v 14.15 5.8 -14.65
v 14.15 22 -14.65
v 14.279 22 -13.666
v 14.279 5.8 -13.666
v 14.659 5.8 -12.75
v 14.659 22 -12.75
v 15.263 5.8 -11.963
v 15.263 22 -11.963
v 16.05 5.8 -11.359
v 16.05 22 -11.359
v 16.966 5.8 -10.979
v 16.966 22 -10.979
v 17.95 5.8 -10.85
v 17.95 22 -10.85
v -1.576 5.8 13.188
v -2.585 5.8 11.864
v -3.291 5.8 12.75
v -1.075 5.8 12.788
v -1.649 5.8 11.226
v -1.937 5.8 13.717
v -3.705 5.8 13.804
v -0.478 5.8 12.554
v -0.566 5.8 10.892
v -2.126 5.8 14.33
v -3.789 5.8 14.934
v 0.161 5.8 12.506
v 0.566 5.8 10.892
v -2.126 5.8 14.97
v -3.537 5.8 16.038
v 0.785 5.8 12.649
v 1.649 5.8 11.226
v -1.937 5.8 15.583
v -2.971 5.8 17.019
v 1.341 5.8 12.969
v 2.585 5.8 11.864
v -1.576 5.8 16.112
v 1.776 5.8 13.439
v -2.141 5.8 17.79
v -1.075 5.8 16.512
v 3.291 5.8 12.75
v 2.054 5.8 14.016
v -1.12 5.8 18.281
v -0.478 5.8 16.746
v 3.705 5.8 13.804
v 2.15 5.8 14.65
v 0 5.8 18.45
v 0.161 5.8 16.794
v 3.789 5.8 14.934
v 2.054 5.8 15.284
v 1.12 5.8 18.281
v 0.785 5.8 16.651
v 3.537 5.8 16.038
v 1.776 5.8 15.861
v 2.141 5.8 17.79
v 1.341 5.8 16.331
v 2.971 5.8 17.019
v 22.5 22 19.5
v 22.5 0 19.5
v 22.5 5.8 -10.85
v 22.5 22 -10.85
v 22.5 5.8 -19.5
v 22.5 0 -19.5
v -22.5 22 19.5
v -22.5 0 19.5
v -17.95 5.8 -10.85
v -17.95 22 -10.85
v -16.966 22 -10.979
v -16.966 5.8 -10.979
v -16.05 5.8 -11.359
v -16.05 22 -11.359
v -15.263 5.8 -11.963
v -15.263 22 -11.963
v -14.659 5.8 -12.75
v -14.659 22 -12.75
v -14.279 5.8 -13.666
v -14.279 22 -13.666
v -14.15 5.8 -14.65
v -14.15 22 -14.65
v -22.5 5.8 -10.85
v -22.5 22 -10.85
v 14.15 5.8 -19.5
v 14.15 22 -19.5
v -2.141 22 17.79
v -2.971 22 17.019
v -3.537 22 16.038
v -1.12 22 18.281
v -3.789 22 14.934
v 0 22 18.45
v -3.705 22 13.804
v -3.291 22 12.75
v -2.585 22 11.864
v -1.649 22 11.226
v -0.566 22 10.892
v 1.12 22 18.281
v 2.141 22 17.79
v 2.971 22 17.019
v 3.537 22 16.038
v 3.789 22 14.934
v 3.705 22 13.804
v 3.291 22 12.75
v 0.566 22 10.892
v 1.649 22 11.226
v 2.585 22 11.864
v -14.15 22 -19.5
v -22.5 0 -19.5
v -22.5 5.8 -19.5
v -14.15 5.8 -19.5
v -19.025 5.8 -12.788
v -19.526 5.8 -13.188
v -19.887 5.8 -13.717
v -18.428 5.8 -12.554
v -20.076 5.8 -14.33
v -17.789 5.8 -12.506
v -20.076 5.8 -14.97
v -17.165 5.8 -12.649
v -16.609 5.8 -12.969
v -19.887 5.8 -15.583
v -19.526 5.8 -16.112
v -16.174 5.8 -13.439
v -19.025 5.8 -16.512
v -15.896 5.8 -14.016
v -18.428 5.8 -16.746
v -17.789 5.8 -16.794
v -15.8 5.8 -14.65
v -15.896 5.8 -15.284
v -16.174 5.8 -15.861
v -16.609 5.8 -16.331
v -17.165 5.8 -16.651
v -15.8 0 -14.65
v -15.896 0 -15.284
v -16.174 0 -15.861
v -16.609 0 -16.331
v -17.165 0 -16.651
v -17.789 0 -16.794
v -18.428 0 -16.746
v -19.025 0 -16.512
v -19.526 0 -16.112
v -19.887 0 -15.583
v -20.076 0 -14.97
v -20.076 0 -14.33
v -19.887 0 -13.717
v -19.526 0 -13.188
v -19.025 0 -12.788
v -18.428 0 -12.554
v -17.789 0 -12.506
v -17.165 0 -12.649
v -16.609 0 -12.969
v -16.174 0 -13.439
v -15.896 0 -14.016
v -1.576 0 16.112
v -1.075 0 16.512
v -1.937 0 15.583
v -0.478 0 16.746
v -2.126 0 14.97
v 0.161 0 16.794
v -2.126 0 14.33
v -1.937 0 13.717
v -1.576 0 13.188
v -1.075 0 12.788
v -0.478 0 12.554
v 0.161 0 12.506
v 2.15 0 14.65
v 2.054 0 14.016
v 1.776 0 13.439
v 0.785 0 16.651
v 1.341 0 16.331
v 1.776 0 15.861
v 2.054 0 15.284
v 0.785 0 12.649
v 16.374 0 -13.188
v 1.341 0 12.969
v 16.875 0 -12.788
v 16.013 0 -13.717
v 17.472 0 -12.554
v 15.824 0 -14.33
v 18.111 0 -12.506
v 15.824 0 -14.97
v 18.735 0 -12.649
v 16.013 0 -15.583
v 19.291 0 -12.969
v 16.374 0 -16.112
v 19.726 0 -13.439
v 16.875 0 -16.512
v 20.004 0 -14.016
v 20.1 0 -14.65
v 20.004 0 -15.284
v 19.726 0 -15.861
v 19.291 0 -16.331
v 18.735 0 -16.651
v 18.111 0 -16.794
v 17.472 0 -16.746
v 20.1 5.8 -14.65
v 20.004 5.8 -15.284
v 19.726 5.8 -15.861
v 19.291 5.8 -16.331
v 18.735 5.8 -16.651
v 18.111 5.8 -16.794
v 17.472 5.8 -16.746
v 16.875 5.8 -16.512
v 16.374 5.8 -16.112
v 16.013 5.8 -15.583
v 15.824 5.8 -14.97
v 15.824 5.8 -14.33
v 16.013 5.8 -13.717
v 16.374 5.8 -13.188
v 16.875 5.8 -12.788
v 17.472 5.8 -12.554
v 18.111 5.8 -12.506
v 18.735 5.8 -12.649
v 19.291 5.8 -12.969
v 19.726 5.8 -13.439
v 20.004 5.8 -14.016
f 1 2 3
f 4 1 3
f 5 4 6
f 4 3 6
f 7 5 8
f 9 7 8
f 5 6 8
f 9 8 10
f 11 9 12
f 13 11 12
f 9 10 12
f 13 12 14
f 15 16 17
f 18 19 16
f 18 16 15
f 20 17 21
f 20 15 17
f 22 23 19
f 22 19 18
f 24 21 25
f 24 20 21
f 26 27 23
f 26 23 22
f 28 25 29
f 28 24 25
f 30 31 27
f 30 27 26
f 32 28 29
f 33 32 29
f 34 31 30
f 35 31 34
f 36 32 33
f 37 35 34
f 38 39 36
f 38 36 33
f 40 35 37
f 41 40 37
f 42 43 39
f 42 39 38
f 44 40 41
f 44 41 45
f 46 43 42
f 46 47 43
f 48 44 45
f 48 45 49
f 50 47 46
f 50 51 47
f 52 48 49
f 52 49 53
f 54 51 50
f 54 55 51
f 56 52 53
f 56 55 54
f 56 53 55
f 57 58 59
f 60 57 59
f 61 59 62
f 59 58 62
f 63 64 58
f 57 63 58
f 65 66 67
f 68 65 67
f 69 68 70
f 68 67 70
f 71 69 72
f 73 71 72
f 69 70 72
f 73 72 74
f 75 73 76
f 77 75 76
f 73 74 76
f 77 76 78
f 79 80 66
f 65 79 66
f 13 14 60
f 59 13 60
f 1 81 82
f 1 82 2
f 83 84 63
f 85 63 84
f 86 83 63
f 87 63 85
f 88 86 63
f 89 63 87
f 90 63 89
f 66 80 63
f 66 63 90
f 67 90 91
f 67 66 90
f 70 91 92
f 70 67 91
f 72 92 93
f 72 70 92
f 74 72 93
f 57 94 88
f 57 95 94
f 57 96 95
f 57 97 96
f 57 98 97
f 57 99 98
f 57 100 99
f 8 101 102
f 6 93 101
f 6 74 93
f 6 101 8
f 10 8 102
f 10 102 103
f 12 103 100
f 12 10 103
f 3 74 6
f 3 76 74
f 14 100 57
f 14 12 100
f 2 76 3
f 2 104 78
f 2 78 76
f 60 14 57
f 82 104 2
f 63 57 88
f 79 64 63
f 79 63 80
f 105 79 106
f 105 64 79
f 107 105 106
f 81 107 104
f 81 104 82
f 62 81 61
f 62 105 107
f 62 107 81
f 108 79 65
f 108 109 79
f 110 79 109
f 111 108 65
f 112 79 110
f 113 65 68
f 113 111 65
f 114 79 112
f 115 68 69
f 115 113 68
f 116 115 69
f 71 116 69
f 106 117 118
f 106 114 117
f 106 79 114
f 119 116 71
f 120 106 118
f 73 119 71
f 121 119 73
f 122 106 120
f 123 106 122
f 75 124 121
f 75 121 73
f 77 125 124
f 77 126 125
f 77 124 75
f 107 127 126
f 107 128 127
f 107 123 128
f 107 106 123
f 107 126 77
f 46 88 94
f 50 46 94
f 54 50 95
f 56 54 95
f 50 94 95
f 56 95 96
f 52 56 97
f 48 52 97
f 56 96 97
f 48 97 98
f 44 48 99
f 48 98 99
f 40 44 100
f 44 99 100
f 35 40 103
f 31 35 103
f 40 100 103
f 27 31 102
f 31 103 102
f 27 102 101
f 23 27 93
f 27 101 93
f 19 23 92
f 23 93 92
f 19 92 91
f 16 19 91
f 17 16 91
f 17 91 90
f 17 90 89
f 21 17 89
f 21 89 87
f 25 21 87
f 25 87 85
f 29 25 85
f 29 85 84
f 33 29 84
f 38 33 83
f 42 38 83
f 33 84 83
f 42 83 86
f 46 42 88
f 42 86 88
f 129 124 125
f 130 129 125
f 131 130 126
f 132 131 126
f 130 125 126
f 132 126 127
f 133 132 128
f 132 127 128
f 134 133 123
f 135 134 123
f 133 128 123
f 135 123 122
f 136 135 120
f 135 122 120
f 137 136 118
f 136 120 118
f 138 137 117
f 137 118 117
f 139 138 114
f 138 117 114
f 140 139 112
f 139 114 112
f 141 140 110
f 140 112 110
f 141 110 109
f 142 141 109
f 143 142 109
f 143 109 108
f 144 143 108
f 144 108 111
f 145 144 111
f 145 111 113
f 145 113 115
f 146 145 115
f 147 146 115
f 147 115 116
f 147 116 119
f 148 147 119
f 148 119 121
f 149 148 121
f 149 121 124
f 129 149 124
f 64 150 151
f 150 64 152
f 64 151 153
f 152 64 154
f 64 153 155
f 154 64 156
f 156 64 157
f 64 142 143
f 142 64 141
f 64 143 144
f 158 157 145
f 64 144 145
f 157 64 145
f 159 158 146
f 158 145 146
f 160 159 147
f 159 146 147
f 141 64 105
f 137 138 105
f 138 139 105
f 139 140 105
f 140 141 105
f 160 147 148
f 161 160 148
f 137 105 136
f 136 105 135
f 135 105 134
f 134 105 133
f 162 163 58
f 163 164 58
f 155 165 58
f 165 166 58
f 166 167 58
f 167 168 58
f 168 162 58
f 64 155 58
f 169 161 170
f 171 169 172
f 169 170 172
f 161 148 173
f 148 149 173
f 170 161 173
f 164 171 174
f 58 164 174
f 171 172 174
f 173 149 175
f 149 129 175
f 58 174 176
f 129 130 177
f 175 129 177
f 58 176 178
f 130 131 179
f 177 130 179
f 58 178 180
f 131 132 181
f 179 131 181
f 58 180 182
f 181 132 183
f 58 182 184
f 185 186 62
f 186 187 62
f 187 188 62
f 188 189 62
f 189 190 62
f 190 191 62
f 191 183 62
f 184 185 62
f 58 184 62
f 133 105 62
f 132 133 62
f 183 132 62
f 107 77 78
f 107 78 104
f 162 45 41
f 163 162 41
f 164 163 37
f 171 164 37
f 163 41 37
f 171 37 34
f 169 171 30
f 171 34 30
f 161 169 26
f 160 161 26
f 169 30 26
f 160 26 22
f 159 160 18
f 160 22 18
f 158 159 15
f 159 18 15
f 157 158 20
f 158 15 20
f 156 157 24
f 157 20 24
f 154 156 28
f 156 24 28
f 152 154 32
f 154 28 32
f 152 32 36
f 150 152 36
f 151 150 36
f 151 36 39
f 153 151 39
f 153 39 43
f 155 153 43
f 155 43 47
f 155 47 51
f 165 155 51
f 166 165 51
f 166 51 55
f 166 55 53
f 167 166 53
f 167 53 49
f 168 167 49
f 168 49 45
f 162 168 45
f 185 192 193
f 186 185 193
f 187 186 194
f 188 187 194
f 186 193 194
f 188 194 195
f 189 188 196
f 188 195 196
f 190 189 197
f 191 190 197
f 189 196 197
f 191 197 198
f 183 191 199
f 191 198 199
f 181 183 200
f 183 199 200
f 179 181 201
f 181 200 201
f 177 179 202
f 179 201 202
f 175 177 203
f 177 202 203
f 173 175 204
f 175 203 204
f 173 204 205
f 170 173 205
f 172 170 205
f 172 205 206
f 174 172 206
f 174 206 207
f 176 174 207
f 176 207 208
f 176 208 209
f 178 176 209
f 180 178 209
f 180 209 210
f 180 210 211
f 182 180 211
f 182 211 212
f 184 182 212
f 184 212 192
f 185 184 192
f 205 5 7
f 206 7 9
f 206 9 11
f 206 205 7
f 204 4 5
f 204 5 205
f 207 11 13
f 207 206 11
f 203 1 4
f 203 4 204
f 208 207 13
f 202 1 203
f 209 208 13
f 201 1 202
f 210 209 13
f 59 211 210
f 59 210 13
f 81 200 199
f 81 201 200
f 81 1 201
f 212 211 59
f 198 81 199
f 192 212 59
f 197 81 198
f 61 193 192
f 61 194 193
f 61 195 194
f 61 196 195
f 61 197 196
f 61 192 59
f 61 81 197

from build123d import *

# Parameters (mm, degrees)
SKETCH1_W            = 45
SKETCH1_H            = 39
BOSS_EXTRUDE1_DEPTH  = 22
M4_CLEARANCE_HOLE1_D = 4.3
SKETCH5_R            = 3.8
CUT_EXTRUDE1_DEPTH   = 16.2


with BuildPart() as part:
    # Sketch1 → Boss-Extrude1 (new body)
    with BuildSketch(Plane(origin=(0, 0, 0), x_dir=(1, 0, 0), z_dir=(0, 1, 0))):
        Rectangle(SKETCH1_W, SKETCH1_H)
    extrude(amount=BOSS_EXTRUDE1_DEPTH)

    # M4 Clearance Hole1 (through all)
    with Locations(Plane(origin=(0, 0, 0), x_dir=(-1, 0, 0), z_dir=(0, -1, 0))):
        with Locations((0, -14.65), (-17.95, 14.65), (17.95, 14.65)):
            Hole(M4_CLEARANCE_HOLE1_D / 2)

    # Sketch5 → Cut-Extrude1 (cut)
    with BuildSketch(Plane(origin=(0, 22, 0), x_dir=(1, 0, 0), z_dir=(0, 1, 0))):
        with Locations(Location((0, -14.65, 0), (0, 0, 270))):
            Circle(SKETCH5_R)
        with BuildLine():
            Line((-14.15, 14.65), (-14.15, 22.25))
            Line((-14.15, 22.25), (-25.55, 22.25))
            Line((-25.55, 22.25), (-25.55, 10.85))
            Line((-25.55, 10.85), (-17.95, 10.85))
            ThreePointArc((-17.95, 10.85), (-15.262994231, 11.962994231), (-14.15, 14.65))
        make_face()
        with BuildLine():
            Line((17.95, 10.85), (25.55, 10.85))
            Line((25.55, 10.85), (25.55, 22.25))
            Line((25.55, 22.25), (14.15, 22.25))
            Line((14.15, 22.25), (14.15, 14.65))
            ThreePointArc((14.15, 14.65), (15.262994231, 11.962994231), (17.95, 10.85))
        make_face()
    extrude(amount=-CUT_EXTRUDE1_DEPTH, mode=Mode.SUBTRACT)


solid = part.part
